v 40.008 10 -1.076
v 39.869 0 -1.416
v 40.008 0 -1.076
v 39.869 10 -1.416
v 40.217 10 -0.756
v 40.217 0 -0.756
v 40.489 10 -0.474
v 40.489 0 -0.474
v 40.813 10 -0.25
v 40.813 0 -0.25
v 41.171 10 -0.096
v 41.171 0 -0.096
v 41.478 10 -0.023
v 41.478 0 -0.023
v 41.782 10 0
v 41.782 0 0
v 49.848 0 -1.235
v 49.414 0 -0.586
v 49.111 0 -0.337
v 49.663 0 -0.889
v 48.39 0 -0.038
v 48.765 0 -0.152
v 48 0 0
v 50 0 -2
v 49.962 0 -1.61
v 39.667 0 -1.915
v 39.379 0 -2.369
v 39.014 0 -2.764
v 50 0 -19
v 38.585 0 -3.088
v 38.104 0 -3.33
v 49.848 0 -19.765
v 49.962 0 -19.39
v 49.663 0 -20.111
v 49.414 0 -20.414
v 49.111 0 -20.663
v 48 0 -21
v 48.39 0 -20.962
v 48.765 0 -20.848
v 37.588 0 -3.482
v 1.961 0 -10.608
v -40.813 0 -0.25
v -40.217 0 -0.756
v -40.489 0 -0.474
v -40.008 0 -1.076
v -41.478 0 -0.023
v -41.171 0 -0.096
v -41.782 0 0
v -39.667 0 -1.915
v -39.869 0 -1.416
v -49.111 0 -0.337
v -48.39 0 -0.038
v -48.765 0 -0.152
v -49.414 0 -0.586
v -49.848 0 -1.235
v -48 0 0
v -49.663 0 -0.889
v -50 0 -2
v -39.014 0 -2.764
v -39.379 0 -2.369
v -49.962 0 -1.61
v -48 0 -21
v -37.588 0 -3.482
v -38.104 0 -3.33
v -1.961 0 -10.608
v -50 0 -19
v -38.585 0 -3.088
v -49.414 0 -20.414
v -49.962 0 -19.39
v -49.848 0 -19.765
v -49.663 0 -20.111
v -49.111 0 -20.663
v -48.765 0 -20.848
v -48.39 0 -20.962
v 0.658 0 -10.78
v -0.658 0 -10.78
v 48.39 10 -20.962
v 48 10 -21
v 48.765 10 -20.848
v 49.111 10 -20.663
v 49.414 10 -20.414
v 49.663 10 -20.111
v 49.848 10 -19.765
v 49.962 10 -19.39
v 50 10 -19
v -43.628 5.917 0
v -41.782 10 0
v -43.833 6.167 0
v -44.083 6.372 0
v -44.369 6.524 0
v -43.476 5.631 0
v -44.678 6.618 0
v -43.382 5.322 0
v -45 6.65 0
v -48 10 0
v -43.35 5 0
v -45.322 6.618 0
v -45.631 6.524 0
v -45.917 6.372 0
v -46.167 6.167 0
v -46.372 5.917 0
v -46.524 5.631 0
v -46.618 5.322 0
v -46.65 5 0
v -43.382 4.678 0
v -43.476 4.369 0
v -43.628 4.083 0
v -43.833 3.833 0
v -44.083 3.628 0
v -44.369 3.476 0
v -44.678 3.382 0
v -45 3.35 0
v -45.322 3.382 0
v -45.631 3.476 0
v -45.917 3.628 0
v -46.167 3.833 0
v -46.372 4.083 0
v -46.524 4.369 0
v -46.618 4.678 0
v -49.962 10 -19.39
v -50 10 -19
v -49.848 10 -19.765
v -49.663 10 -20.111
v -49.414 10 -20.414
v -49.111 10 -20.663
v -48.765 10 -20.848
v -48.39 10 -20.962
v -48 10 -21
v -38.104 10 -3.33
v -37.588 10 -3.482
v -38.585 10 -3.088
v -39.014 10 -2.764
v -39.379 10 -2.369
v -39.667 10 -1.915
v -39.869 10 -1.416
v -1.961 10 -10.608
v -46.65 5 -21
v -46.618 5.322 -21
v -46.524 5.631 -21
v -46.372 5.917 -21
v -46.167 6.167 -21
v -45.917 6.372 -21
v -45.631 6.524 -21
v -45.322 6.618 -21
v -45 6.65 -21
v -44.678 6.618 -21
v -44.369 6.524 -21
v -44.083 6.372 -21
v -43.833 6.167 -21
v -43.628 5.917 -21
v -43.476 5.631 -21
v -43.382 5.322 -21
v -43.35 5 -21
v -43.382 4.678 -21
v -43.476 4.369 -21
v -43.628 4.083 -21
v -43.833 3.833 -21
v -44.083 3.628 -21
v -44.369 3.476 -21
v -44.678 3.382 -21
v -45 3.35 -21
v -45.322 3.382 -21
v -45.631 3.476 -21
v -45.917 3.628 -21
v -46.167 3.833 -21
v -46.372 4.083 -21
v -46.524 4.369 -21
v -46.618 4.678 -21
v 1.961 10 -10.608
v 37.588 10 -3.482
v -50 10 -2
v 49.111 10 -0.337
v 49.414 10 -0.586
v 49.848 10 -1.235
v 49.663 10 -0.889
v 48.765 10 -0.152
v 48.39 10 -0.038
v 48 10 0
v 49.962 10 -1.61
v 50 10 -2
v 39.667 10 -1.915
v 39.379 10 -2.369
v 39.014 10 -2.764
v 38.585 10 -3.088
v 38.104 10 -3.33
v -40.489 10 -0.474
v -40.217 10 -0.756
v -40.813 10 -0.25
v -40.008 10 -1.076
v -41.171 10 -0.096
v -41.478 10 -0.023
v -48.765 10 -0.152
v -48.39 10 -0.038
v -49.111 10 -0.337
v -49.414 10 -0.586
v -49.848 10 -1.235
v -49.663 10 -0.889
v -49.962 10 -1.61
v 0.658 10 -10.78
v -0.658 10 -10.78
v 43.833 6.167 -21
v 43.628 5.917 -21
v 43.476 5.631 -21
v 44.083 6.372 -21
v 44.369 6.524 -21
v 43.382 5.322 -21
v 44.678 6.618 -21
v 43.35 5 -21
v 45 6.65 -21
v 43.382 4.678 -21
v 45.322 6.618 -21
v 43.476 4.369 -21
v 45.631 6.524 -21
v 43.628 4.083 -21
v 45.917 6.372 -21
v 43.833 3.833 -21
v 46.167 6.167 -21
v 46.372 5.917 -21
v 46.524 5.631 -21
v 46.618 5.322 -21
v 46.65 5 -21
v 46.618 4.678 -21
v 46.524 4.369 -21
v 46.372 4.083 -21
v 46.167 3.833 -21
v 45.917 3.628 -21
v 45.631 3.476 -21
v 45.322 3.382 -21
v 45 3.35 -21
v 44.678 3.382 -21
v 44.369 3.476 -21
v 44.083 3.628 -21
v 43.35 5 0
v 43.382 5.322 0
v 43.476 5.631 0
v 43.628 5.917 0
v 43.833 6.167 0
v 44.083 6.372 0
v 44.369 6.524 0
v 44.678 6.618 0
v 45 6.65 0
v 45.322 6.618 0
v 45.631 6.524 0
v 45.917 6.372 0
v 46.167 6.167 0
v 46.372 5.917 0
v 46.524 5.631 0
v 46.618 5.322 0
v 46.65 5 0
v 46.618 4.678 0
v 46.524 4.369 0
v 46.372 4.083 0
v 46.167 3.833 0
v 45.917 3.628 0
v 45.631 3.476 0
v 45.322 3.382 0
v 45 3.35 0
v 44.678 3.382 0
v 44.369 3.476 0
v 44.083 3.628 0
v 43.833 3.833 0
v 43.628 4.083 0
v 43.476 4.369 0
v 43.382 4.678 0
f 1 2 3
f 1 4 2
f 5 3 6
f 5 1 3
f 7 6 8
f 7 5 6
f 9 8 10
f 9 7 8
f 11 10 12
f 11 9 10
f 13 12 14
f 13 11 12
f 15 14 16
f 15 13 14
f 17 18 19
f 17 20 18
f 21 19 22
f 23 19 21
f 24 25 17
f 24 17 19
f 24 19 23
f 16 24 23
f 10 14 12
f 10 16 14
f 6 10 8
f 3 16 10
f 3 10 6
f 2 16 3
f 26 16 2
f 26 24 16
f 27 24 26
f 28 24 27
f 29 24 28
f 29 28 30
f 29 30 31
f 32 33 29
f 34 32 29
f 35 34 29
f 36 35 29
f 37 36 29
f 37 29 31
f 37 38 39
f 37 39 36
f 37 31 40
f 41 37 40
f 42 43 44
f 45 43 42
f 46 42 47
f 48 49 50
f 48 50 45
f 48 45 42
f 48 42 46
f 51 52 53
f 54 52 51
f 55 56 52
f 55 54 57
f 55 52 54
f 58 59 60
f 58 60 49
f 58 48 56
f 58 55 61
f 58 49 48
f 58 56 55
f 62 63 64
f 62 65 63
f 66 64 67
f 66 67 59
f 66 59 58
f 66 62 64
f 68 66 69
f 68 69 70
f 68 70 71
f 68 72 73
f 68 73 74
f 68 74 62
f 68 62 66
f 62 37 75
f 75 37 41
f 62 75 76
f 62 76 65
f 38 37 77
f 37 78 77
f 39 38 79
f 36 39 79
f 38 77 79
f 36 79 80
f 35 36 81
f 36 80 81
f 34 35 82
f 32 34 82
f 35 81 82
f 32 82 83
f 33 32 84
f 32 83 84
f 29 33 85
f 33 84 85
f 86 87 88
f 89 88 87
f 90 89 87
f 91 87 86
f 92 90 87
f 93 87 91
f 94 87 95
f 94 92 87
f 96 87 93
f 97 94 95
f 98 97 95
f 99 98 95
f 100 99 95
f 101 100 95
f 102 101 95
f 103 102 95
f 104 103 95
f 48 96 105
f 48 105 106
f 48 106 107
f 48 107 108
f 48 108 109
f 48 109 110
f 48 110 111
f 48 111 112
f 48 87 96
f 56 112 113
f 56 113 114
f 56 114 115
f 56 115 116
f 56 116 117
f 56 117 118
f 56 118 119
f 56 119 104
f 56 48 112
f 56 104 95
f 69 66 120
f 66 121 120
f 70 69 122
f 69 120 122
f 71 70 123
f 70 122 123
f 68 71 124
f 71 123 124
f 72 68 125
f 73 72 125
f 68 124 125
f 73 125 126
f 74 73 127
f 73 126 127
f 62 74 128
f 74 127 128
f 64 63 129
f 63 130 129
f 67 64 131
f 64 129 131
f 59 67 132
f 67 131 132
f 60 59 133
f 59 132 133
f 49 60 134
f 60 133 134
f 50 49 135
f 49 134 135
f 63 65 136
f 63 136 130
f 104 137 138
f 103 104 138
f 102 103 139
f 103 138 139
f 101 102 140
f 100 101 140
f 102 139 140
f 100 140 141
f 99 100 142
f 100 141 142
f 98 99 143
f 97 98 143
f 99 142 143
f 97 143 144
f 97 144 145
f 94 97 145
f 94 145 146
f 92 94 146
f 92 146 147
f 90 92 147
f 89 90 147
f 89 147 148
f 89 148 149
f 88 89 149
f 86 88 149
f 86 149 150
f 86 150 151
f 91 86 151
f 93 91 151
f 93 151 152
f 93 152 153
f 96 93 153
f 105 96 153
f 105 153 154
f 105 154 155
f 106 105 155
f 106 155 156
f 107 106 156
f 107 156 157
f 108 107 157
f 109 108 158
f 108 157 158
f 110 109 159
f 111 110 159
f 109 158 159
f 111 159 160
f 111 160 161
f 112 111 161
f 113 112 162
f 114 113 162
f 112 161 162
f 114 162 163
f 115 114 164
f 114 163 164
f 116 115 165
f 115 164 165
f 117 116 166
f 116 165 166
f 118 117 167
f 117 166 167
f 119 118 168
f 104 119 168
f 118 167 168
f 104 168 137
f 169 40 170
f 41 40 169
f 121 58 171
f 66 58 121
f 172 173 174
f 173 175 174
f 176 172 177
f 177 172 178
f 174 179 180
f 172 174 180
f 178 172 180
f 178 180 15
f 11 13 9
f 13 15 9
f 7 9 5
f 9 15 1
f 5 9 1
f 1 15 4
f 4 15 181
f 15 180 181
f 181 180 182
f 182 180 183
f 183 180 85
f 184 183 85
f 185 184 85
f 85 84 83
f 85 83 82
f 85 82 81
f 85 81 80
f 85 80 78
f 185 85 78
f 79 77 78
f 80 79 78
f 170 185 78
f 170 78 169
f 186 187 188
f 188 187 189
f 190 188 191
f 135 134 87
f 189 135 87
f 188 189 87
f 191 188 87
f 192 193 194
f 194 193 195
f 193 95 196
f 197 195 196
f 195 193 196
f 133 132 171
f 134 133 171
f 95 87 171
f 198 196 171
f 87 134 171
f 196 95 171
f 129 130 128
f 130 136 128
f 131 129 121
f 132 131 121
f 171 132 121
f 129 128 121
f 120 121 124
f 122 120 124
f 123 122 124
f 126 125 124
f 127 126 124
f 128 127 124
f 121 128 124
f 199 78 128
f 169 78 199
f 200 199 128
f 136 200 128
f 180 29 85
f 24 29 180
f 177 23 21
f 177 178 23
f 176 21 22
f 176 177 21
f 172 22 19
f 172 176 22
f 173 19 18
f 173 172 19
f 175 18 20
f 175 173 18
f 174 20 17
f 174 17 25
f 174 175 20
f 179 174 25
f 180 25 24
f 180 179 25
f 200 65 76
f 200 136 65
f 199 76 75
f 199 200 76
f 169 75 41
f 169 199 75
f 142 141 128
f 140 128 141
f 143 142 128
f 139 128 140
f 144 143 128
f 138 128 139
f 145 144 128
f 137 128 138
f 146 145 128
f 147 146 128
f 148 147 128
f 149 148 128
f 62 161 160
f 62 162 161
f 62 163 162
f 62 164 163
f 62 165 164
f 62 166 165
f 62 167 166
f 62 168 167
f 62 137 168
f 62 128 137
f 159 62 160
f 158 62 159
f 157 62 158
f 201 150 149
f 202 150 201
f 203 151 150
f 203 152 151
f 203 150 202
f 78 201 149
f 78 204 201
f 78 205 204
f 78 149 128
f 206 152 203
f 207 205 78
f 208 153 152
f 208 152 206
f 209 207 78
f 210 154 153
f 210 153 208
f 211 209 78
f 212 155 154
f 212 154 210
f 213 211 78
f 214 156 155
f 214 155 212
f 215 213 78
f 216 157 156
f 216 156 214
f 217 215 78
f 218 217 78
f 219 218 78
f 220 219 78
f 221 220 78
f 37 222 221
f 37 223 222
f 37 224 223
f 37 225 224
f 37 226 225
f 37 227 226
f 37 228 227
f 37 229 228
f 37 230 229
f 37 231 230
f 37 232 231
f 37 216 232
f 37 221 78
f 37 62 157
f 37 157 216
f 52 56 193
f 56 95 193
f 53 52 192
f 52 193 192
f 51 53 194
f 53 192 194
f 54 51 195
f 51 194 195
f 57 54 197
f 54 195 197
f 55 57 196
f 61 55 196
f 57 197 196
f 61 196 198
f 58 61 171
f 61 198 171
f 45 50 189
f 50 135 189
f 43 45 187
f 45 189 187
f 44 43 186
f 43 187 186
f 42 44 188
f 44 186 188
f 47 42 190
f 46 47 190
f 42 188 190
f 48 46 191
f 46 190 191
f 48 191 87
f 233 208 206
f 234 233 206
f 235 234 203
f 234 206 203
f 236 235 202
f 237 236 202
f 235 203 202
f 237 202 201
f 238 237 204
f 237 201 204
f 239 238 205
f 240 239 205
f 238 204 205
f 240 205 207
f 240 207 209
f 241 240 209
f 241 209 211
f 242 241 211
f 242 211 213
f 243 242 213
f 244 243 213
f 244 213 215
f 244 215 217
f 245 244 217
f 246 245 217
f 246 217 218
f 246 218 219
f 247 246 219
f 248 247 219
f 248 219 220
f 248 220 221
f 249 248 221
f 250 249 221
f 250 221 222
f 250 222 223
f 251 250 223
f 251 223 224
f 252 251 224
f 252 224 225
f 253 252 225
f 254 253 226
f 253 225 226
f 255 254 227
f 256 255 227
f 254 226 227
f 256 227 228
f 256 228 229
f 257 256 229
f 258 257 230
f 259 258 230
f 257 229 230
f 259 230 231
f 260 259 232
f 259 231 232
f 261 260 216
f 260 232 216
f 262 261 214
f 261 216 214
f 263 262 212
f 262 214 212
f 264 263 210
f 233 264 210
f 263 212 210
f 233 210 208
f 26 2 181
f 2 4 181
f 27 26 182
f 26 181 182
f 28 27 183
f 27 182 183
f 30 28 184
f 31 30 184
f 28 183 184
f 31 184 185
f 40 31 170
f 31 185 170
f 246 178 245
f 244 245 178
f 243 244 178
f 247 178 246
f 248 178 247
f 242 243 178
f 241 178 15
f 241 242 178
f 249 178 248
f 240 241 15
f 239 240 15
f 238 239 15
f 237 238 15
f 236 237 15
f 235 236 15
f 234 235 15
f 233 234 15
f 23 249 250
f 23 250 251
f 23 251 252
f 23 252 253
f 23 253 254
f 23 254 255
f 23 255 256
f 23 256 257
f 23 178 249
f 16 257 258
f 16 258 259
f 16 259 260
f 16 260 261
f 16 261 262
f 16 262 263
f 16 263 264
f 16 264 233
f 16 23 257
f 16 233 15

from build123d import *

# Parameters (mm, degrees)
EXTRUDE_1_DEPTH = 10
FILLET_1_R      = 3
FILLET_2_R      = 10
M4X0_71_D       = 3.3
FILLET_3_R      = 2


with BuildPart() as part:
    # Эскиз1 → Бобышка-Вытянуть1 (new body)
    with BuildSketch(Plane(origin=(0, 0, 0), x_dir=(1, 0, 0), z_dir=(0, 1, 0))):
        Polygon((0, 11), (-40, 3), (-40, 0), (-50, 0), (-50, 21), (50, 21), (50, 0), (40, 0), (40, 3), align=None)
    extrude(amount=EXTRUDE_1_DEPTH)

    # Скругление1
    fillet_1_edges = [part.edges().sort_by_distance(p)[0] for p in [
        (-40, 5, -3),
        (40, 5, -3),
    ]]
    fillet(fillet_1_edges, radius=FILLET_1_R)

    # Скругление2
    fillet_2_edges = [part.edges().sort_by_distance(p)[0] for p in [
        (0, 5, -11),
    ]]
    fillet(fillet_2_edges, radius=FILLET_2_R)

    # Отверстие обработанное метчиком M4x0.71 (through all)
    with Locations(Plane.XY):
        with Locations((-45, 5), (45, 5)):
            Hole(M4X0_71_D / 2)

    # Скругление3
    fillet_3_edges = [part.edges().sort_by_distance(p)[0] for p in [
        (40, 5, 0),
        (50, 5, 0),
        (50, 5, -21),
        (-50, 5, -21),
        (-50, 5, 0),
        (-40, 5, 0),
    ]]
    fillet(fillet_3_edges, radius=FILLET_3_R)


solid = part.part
